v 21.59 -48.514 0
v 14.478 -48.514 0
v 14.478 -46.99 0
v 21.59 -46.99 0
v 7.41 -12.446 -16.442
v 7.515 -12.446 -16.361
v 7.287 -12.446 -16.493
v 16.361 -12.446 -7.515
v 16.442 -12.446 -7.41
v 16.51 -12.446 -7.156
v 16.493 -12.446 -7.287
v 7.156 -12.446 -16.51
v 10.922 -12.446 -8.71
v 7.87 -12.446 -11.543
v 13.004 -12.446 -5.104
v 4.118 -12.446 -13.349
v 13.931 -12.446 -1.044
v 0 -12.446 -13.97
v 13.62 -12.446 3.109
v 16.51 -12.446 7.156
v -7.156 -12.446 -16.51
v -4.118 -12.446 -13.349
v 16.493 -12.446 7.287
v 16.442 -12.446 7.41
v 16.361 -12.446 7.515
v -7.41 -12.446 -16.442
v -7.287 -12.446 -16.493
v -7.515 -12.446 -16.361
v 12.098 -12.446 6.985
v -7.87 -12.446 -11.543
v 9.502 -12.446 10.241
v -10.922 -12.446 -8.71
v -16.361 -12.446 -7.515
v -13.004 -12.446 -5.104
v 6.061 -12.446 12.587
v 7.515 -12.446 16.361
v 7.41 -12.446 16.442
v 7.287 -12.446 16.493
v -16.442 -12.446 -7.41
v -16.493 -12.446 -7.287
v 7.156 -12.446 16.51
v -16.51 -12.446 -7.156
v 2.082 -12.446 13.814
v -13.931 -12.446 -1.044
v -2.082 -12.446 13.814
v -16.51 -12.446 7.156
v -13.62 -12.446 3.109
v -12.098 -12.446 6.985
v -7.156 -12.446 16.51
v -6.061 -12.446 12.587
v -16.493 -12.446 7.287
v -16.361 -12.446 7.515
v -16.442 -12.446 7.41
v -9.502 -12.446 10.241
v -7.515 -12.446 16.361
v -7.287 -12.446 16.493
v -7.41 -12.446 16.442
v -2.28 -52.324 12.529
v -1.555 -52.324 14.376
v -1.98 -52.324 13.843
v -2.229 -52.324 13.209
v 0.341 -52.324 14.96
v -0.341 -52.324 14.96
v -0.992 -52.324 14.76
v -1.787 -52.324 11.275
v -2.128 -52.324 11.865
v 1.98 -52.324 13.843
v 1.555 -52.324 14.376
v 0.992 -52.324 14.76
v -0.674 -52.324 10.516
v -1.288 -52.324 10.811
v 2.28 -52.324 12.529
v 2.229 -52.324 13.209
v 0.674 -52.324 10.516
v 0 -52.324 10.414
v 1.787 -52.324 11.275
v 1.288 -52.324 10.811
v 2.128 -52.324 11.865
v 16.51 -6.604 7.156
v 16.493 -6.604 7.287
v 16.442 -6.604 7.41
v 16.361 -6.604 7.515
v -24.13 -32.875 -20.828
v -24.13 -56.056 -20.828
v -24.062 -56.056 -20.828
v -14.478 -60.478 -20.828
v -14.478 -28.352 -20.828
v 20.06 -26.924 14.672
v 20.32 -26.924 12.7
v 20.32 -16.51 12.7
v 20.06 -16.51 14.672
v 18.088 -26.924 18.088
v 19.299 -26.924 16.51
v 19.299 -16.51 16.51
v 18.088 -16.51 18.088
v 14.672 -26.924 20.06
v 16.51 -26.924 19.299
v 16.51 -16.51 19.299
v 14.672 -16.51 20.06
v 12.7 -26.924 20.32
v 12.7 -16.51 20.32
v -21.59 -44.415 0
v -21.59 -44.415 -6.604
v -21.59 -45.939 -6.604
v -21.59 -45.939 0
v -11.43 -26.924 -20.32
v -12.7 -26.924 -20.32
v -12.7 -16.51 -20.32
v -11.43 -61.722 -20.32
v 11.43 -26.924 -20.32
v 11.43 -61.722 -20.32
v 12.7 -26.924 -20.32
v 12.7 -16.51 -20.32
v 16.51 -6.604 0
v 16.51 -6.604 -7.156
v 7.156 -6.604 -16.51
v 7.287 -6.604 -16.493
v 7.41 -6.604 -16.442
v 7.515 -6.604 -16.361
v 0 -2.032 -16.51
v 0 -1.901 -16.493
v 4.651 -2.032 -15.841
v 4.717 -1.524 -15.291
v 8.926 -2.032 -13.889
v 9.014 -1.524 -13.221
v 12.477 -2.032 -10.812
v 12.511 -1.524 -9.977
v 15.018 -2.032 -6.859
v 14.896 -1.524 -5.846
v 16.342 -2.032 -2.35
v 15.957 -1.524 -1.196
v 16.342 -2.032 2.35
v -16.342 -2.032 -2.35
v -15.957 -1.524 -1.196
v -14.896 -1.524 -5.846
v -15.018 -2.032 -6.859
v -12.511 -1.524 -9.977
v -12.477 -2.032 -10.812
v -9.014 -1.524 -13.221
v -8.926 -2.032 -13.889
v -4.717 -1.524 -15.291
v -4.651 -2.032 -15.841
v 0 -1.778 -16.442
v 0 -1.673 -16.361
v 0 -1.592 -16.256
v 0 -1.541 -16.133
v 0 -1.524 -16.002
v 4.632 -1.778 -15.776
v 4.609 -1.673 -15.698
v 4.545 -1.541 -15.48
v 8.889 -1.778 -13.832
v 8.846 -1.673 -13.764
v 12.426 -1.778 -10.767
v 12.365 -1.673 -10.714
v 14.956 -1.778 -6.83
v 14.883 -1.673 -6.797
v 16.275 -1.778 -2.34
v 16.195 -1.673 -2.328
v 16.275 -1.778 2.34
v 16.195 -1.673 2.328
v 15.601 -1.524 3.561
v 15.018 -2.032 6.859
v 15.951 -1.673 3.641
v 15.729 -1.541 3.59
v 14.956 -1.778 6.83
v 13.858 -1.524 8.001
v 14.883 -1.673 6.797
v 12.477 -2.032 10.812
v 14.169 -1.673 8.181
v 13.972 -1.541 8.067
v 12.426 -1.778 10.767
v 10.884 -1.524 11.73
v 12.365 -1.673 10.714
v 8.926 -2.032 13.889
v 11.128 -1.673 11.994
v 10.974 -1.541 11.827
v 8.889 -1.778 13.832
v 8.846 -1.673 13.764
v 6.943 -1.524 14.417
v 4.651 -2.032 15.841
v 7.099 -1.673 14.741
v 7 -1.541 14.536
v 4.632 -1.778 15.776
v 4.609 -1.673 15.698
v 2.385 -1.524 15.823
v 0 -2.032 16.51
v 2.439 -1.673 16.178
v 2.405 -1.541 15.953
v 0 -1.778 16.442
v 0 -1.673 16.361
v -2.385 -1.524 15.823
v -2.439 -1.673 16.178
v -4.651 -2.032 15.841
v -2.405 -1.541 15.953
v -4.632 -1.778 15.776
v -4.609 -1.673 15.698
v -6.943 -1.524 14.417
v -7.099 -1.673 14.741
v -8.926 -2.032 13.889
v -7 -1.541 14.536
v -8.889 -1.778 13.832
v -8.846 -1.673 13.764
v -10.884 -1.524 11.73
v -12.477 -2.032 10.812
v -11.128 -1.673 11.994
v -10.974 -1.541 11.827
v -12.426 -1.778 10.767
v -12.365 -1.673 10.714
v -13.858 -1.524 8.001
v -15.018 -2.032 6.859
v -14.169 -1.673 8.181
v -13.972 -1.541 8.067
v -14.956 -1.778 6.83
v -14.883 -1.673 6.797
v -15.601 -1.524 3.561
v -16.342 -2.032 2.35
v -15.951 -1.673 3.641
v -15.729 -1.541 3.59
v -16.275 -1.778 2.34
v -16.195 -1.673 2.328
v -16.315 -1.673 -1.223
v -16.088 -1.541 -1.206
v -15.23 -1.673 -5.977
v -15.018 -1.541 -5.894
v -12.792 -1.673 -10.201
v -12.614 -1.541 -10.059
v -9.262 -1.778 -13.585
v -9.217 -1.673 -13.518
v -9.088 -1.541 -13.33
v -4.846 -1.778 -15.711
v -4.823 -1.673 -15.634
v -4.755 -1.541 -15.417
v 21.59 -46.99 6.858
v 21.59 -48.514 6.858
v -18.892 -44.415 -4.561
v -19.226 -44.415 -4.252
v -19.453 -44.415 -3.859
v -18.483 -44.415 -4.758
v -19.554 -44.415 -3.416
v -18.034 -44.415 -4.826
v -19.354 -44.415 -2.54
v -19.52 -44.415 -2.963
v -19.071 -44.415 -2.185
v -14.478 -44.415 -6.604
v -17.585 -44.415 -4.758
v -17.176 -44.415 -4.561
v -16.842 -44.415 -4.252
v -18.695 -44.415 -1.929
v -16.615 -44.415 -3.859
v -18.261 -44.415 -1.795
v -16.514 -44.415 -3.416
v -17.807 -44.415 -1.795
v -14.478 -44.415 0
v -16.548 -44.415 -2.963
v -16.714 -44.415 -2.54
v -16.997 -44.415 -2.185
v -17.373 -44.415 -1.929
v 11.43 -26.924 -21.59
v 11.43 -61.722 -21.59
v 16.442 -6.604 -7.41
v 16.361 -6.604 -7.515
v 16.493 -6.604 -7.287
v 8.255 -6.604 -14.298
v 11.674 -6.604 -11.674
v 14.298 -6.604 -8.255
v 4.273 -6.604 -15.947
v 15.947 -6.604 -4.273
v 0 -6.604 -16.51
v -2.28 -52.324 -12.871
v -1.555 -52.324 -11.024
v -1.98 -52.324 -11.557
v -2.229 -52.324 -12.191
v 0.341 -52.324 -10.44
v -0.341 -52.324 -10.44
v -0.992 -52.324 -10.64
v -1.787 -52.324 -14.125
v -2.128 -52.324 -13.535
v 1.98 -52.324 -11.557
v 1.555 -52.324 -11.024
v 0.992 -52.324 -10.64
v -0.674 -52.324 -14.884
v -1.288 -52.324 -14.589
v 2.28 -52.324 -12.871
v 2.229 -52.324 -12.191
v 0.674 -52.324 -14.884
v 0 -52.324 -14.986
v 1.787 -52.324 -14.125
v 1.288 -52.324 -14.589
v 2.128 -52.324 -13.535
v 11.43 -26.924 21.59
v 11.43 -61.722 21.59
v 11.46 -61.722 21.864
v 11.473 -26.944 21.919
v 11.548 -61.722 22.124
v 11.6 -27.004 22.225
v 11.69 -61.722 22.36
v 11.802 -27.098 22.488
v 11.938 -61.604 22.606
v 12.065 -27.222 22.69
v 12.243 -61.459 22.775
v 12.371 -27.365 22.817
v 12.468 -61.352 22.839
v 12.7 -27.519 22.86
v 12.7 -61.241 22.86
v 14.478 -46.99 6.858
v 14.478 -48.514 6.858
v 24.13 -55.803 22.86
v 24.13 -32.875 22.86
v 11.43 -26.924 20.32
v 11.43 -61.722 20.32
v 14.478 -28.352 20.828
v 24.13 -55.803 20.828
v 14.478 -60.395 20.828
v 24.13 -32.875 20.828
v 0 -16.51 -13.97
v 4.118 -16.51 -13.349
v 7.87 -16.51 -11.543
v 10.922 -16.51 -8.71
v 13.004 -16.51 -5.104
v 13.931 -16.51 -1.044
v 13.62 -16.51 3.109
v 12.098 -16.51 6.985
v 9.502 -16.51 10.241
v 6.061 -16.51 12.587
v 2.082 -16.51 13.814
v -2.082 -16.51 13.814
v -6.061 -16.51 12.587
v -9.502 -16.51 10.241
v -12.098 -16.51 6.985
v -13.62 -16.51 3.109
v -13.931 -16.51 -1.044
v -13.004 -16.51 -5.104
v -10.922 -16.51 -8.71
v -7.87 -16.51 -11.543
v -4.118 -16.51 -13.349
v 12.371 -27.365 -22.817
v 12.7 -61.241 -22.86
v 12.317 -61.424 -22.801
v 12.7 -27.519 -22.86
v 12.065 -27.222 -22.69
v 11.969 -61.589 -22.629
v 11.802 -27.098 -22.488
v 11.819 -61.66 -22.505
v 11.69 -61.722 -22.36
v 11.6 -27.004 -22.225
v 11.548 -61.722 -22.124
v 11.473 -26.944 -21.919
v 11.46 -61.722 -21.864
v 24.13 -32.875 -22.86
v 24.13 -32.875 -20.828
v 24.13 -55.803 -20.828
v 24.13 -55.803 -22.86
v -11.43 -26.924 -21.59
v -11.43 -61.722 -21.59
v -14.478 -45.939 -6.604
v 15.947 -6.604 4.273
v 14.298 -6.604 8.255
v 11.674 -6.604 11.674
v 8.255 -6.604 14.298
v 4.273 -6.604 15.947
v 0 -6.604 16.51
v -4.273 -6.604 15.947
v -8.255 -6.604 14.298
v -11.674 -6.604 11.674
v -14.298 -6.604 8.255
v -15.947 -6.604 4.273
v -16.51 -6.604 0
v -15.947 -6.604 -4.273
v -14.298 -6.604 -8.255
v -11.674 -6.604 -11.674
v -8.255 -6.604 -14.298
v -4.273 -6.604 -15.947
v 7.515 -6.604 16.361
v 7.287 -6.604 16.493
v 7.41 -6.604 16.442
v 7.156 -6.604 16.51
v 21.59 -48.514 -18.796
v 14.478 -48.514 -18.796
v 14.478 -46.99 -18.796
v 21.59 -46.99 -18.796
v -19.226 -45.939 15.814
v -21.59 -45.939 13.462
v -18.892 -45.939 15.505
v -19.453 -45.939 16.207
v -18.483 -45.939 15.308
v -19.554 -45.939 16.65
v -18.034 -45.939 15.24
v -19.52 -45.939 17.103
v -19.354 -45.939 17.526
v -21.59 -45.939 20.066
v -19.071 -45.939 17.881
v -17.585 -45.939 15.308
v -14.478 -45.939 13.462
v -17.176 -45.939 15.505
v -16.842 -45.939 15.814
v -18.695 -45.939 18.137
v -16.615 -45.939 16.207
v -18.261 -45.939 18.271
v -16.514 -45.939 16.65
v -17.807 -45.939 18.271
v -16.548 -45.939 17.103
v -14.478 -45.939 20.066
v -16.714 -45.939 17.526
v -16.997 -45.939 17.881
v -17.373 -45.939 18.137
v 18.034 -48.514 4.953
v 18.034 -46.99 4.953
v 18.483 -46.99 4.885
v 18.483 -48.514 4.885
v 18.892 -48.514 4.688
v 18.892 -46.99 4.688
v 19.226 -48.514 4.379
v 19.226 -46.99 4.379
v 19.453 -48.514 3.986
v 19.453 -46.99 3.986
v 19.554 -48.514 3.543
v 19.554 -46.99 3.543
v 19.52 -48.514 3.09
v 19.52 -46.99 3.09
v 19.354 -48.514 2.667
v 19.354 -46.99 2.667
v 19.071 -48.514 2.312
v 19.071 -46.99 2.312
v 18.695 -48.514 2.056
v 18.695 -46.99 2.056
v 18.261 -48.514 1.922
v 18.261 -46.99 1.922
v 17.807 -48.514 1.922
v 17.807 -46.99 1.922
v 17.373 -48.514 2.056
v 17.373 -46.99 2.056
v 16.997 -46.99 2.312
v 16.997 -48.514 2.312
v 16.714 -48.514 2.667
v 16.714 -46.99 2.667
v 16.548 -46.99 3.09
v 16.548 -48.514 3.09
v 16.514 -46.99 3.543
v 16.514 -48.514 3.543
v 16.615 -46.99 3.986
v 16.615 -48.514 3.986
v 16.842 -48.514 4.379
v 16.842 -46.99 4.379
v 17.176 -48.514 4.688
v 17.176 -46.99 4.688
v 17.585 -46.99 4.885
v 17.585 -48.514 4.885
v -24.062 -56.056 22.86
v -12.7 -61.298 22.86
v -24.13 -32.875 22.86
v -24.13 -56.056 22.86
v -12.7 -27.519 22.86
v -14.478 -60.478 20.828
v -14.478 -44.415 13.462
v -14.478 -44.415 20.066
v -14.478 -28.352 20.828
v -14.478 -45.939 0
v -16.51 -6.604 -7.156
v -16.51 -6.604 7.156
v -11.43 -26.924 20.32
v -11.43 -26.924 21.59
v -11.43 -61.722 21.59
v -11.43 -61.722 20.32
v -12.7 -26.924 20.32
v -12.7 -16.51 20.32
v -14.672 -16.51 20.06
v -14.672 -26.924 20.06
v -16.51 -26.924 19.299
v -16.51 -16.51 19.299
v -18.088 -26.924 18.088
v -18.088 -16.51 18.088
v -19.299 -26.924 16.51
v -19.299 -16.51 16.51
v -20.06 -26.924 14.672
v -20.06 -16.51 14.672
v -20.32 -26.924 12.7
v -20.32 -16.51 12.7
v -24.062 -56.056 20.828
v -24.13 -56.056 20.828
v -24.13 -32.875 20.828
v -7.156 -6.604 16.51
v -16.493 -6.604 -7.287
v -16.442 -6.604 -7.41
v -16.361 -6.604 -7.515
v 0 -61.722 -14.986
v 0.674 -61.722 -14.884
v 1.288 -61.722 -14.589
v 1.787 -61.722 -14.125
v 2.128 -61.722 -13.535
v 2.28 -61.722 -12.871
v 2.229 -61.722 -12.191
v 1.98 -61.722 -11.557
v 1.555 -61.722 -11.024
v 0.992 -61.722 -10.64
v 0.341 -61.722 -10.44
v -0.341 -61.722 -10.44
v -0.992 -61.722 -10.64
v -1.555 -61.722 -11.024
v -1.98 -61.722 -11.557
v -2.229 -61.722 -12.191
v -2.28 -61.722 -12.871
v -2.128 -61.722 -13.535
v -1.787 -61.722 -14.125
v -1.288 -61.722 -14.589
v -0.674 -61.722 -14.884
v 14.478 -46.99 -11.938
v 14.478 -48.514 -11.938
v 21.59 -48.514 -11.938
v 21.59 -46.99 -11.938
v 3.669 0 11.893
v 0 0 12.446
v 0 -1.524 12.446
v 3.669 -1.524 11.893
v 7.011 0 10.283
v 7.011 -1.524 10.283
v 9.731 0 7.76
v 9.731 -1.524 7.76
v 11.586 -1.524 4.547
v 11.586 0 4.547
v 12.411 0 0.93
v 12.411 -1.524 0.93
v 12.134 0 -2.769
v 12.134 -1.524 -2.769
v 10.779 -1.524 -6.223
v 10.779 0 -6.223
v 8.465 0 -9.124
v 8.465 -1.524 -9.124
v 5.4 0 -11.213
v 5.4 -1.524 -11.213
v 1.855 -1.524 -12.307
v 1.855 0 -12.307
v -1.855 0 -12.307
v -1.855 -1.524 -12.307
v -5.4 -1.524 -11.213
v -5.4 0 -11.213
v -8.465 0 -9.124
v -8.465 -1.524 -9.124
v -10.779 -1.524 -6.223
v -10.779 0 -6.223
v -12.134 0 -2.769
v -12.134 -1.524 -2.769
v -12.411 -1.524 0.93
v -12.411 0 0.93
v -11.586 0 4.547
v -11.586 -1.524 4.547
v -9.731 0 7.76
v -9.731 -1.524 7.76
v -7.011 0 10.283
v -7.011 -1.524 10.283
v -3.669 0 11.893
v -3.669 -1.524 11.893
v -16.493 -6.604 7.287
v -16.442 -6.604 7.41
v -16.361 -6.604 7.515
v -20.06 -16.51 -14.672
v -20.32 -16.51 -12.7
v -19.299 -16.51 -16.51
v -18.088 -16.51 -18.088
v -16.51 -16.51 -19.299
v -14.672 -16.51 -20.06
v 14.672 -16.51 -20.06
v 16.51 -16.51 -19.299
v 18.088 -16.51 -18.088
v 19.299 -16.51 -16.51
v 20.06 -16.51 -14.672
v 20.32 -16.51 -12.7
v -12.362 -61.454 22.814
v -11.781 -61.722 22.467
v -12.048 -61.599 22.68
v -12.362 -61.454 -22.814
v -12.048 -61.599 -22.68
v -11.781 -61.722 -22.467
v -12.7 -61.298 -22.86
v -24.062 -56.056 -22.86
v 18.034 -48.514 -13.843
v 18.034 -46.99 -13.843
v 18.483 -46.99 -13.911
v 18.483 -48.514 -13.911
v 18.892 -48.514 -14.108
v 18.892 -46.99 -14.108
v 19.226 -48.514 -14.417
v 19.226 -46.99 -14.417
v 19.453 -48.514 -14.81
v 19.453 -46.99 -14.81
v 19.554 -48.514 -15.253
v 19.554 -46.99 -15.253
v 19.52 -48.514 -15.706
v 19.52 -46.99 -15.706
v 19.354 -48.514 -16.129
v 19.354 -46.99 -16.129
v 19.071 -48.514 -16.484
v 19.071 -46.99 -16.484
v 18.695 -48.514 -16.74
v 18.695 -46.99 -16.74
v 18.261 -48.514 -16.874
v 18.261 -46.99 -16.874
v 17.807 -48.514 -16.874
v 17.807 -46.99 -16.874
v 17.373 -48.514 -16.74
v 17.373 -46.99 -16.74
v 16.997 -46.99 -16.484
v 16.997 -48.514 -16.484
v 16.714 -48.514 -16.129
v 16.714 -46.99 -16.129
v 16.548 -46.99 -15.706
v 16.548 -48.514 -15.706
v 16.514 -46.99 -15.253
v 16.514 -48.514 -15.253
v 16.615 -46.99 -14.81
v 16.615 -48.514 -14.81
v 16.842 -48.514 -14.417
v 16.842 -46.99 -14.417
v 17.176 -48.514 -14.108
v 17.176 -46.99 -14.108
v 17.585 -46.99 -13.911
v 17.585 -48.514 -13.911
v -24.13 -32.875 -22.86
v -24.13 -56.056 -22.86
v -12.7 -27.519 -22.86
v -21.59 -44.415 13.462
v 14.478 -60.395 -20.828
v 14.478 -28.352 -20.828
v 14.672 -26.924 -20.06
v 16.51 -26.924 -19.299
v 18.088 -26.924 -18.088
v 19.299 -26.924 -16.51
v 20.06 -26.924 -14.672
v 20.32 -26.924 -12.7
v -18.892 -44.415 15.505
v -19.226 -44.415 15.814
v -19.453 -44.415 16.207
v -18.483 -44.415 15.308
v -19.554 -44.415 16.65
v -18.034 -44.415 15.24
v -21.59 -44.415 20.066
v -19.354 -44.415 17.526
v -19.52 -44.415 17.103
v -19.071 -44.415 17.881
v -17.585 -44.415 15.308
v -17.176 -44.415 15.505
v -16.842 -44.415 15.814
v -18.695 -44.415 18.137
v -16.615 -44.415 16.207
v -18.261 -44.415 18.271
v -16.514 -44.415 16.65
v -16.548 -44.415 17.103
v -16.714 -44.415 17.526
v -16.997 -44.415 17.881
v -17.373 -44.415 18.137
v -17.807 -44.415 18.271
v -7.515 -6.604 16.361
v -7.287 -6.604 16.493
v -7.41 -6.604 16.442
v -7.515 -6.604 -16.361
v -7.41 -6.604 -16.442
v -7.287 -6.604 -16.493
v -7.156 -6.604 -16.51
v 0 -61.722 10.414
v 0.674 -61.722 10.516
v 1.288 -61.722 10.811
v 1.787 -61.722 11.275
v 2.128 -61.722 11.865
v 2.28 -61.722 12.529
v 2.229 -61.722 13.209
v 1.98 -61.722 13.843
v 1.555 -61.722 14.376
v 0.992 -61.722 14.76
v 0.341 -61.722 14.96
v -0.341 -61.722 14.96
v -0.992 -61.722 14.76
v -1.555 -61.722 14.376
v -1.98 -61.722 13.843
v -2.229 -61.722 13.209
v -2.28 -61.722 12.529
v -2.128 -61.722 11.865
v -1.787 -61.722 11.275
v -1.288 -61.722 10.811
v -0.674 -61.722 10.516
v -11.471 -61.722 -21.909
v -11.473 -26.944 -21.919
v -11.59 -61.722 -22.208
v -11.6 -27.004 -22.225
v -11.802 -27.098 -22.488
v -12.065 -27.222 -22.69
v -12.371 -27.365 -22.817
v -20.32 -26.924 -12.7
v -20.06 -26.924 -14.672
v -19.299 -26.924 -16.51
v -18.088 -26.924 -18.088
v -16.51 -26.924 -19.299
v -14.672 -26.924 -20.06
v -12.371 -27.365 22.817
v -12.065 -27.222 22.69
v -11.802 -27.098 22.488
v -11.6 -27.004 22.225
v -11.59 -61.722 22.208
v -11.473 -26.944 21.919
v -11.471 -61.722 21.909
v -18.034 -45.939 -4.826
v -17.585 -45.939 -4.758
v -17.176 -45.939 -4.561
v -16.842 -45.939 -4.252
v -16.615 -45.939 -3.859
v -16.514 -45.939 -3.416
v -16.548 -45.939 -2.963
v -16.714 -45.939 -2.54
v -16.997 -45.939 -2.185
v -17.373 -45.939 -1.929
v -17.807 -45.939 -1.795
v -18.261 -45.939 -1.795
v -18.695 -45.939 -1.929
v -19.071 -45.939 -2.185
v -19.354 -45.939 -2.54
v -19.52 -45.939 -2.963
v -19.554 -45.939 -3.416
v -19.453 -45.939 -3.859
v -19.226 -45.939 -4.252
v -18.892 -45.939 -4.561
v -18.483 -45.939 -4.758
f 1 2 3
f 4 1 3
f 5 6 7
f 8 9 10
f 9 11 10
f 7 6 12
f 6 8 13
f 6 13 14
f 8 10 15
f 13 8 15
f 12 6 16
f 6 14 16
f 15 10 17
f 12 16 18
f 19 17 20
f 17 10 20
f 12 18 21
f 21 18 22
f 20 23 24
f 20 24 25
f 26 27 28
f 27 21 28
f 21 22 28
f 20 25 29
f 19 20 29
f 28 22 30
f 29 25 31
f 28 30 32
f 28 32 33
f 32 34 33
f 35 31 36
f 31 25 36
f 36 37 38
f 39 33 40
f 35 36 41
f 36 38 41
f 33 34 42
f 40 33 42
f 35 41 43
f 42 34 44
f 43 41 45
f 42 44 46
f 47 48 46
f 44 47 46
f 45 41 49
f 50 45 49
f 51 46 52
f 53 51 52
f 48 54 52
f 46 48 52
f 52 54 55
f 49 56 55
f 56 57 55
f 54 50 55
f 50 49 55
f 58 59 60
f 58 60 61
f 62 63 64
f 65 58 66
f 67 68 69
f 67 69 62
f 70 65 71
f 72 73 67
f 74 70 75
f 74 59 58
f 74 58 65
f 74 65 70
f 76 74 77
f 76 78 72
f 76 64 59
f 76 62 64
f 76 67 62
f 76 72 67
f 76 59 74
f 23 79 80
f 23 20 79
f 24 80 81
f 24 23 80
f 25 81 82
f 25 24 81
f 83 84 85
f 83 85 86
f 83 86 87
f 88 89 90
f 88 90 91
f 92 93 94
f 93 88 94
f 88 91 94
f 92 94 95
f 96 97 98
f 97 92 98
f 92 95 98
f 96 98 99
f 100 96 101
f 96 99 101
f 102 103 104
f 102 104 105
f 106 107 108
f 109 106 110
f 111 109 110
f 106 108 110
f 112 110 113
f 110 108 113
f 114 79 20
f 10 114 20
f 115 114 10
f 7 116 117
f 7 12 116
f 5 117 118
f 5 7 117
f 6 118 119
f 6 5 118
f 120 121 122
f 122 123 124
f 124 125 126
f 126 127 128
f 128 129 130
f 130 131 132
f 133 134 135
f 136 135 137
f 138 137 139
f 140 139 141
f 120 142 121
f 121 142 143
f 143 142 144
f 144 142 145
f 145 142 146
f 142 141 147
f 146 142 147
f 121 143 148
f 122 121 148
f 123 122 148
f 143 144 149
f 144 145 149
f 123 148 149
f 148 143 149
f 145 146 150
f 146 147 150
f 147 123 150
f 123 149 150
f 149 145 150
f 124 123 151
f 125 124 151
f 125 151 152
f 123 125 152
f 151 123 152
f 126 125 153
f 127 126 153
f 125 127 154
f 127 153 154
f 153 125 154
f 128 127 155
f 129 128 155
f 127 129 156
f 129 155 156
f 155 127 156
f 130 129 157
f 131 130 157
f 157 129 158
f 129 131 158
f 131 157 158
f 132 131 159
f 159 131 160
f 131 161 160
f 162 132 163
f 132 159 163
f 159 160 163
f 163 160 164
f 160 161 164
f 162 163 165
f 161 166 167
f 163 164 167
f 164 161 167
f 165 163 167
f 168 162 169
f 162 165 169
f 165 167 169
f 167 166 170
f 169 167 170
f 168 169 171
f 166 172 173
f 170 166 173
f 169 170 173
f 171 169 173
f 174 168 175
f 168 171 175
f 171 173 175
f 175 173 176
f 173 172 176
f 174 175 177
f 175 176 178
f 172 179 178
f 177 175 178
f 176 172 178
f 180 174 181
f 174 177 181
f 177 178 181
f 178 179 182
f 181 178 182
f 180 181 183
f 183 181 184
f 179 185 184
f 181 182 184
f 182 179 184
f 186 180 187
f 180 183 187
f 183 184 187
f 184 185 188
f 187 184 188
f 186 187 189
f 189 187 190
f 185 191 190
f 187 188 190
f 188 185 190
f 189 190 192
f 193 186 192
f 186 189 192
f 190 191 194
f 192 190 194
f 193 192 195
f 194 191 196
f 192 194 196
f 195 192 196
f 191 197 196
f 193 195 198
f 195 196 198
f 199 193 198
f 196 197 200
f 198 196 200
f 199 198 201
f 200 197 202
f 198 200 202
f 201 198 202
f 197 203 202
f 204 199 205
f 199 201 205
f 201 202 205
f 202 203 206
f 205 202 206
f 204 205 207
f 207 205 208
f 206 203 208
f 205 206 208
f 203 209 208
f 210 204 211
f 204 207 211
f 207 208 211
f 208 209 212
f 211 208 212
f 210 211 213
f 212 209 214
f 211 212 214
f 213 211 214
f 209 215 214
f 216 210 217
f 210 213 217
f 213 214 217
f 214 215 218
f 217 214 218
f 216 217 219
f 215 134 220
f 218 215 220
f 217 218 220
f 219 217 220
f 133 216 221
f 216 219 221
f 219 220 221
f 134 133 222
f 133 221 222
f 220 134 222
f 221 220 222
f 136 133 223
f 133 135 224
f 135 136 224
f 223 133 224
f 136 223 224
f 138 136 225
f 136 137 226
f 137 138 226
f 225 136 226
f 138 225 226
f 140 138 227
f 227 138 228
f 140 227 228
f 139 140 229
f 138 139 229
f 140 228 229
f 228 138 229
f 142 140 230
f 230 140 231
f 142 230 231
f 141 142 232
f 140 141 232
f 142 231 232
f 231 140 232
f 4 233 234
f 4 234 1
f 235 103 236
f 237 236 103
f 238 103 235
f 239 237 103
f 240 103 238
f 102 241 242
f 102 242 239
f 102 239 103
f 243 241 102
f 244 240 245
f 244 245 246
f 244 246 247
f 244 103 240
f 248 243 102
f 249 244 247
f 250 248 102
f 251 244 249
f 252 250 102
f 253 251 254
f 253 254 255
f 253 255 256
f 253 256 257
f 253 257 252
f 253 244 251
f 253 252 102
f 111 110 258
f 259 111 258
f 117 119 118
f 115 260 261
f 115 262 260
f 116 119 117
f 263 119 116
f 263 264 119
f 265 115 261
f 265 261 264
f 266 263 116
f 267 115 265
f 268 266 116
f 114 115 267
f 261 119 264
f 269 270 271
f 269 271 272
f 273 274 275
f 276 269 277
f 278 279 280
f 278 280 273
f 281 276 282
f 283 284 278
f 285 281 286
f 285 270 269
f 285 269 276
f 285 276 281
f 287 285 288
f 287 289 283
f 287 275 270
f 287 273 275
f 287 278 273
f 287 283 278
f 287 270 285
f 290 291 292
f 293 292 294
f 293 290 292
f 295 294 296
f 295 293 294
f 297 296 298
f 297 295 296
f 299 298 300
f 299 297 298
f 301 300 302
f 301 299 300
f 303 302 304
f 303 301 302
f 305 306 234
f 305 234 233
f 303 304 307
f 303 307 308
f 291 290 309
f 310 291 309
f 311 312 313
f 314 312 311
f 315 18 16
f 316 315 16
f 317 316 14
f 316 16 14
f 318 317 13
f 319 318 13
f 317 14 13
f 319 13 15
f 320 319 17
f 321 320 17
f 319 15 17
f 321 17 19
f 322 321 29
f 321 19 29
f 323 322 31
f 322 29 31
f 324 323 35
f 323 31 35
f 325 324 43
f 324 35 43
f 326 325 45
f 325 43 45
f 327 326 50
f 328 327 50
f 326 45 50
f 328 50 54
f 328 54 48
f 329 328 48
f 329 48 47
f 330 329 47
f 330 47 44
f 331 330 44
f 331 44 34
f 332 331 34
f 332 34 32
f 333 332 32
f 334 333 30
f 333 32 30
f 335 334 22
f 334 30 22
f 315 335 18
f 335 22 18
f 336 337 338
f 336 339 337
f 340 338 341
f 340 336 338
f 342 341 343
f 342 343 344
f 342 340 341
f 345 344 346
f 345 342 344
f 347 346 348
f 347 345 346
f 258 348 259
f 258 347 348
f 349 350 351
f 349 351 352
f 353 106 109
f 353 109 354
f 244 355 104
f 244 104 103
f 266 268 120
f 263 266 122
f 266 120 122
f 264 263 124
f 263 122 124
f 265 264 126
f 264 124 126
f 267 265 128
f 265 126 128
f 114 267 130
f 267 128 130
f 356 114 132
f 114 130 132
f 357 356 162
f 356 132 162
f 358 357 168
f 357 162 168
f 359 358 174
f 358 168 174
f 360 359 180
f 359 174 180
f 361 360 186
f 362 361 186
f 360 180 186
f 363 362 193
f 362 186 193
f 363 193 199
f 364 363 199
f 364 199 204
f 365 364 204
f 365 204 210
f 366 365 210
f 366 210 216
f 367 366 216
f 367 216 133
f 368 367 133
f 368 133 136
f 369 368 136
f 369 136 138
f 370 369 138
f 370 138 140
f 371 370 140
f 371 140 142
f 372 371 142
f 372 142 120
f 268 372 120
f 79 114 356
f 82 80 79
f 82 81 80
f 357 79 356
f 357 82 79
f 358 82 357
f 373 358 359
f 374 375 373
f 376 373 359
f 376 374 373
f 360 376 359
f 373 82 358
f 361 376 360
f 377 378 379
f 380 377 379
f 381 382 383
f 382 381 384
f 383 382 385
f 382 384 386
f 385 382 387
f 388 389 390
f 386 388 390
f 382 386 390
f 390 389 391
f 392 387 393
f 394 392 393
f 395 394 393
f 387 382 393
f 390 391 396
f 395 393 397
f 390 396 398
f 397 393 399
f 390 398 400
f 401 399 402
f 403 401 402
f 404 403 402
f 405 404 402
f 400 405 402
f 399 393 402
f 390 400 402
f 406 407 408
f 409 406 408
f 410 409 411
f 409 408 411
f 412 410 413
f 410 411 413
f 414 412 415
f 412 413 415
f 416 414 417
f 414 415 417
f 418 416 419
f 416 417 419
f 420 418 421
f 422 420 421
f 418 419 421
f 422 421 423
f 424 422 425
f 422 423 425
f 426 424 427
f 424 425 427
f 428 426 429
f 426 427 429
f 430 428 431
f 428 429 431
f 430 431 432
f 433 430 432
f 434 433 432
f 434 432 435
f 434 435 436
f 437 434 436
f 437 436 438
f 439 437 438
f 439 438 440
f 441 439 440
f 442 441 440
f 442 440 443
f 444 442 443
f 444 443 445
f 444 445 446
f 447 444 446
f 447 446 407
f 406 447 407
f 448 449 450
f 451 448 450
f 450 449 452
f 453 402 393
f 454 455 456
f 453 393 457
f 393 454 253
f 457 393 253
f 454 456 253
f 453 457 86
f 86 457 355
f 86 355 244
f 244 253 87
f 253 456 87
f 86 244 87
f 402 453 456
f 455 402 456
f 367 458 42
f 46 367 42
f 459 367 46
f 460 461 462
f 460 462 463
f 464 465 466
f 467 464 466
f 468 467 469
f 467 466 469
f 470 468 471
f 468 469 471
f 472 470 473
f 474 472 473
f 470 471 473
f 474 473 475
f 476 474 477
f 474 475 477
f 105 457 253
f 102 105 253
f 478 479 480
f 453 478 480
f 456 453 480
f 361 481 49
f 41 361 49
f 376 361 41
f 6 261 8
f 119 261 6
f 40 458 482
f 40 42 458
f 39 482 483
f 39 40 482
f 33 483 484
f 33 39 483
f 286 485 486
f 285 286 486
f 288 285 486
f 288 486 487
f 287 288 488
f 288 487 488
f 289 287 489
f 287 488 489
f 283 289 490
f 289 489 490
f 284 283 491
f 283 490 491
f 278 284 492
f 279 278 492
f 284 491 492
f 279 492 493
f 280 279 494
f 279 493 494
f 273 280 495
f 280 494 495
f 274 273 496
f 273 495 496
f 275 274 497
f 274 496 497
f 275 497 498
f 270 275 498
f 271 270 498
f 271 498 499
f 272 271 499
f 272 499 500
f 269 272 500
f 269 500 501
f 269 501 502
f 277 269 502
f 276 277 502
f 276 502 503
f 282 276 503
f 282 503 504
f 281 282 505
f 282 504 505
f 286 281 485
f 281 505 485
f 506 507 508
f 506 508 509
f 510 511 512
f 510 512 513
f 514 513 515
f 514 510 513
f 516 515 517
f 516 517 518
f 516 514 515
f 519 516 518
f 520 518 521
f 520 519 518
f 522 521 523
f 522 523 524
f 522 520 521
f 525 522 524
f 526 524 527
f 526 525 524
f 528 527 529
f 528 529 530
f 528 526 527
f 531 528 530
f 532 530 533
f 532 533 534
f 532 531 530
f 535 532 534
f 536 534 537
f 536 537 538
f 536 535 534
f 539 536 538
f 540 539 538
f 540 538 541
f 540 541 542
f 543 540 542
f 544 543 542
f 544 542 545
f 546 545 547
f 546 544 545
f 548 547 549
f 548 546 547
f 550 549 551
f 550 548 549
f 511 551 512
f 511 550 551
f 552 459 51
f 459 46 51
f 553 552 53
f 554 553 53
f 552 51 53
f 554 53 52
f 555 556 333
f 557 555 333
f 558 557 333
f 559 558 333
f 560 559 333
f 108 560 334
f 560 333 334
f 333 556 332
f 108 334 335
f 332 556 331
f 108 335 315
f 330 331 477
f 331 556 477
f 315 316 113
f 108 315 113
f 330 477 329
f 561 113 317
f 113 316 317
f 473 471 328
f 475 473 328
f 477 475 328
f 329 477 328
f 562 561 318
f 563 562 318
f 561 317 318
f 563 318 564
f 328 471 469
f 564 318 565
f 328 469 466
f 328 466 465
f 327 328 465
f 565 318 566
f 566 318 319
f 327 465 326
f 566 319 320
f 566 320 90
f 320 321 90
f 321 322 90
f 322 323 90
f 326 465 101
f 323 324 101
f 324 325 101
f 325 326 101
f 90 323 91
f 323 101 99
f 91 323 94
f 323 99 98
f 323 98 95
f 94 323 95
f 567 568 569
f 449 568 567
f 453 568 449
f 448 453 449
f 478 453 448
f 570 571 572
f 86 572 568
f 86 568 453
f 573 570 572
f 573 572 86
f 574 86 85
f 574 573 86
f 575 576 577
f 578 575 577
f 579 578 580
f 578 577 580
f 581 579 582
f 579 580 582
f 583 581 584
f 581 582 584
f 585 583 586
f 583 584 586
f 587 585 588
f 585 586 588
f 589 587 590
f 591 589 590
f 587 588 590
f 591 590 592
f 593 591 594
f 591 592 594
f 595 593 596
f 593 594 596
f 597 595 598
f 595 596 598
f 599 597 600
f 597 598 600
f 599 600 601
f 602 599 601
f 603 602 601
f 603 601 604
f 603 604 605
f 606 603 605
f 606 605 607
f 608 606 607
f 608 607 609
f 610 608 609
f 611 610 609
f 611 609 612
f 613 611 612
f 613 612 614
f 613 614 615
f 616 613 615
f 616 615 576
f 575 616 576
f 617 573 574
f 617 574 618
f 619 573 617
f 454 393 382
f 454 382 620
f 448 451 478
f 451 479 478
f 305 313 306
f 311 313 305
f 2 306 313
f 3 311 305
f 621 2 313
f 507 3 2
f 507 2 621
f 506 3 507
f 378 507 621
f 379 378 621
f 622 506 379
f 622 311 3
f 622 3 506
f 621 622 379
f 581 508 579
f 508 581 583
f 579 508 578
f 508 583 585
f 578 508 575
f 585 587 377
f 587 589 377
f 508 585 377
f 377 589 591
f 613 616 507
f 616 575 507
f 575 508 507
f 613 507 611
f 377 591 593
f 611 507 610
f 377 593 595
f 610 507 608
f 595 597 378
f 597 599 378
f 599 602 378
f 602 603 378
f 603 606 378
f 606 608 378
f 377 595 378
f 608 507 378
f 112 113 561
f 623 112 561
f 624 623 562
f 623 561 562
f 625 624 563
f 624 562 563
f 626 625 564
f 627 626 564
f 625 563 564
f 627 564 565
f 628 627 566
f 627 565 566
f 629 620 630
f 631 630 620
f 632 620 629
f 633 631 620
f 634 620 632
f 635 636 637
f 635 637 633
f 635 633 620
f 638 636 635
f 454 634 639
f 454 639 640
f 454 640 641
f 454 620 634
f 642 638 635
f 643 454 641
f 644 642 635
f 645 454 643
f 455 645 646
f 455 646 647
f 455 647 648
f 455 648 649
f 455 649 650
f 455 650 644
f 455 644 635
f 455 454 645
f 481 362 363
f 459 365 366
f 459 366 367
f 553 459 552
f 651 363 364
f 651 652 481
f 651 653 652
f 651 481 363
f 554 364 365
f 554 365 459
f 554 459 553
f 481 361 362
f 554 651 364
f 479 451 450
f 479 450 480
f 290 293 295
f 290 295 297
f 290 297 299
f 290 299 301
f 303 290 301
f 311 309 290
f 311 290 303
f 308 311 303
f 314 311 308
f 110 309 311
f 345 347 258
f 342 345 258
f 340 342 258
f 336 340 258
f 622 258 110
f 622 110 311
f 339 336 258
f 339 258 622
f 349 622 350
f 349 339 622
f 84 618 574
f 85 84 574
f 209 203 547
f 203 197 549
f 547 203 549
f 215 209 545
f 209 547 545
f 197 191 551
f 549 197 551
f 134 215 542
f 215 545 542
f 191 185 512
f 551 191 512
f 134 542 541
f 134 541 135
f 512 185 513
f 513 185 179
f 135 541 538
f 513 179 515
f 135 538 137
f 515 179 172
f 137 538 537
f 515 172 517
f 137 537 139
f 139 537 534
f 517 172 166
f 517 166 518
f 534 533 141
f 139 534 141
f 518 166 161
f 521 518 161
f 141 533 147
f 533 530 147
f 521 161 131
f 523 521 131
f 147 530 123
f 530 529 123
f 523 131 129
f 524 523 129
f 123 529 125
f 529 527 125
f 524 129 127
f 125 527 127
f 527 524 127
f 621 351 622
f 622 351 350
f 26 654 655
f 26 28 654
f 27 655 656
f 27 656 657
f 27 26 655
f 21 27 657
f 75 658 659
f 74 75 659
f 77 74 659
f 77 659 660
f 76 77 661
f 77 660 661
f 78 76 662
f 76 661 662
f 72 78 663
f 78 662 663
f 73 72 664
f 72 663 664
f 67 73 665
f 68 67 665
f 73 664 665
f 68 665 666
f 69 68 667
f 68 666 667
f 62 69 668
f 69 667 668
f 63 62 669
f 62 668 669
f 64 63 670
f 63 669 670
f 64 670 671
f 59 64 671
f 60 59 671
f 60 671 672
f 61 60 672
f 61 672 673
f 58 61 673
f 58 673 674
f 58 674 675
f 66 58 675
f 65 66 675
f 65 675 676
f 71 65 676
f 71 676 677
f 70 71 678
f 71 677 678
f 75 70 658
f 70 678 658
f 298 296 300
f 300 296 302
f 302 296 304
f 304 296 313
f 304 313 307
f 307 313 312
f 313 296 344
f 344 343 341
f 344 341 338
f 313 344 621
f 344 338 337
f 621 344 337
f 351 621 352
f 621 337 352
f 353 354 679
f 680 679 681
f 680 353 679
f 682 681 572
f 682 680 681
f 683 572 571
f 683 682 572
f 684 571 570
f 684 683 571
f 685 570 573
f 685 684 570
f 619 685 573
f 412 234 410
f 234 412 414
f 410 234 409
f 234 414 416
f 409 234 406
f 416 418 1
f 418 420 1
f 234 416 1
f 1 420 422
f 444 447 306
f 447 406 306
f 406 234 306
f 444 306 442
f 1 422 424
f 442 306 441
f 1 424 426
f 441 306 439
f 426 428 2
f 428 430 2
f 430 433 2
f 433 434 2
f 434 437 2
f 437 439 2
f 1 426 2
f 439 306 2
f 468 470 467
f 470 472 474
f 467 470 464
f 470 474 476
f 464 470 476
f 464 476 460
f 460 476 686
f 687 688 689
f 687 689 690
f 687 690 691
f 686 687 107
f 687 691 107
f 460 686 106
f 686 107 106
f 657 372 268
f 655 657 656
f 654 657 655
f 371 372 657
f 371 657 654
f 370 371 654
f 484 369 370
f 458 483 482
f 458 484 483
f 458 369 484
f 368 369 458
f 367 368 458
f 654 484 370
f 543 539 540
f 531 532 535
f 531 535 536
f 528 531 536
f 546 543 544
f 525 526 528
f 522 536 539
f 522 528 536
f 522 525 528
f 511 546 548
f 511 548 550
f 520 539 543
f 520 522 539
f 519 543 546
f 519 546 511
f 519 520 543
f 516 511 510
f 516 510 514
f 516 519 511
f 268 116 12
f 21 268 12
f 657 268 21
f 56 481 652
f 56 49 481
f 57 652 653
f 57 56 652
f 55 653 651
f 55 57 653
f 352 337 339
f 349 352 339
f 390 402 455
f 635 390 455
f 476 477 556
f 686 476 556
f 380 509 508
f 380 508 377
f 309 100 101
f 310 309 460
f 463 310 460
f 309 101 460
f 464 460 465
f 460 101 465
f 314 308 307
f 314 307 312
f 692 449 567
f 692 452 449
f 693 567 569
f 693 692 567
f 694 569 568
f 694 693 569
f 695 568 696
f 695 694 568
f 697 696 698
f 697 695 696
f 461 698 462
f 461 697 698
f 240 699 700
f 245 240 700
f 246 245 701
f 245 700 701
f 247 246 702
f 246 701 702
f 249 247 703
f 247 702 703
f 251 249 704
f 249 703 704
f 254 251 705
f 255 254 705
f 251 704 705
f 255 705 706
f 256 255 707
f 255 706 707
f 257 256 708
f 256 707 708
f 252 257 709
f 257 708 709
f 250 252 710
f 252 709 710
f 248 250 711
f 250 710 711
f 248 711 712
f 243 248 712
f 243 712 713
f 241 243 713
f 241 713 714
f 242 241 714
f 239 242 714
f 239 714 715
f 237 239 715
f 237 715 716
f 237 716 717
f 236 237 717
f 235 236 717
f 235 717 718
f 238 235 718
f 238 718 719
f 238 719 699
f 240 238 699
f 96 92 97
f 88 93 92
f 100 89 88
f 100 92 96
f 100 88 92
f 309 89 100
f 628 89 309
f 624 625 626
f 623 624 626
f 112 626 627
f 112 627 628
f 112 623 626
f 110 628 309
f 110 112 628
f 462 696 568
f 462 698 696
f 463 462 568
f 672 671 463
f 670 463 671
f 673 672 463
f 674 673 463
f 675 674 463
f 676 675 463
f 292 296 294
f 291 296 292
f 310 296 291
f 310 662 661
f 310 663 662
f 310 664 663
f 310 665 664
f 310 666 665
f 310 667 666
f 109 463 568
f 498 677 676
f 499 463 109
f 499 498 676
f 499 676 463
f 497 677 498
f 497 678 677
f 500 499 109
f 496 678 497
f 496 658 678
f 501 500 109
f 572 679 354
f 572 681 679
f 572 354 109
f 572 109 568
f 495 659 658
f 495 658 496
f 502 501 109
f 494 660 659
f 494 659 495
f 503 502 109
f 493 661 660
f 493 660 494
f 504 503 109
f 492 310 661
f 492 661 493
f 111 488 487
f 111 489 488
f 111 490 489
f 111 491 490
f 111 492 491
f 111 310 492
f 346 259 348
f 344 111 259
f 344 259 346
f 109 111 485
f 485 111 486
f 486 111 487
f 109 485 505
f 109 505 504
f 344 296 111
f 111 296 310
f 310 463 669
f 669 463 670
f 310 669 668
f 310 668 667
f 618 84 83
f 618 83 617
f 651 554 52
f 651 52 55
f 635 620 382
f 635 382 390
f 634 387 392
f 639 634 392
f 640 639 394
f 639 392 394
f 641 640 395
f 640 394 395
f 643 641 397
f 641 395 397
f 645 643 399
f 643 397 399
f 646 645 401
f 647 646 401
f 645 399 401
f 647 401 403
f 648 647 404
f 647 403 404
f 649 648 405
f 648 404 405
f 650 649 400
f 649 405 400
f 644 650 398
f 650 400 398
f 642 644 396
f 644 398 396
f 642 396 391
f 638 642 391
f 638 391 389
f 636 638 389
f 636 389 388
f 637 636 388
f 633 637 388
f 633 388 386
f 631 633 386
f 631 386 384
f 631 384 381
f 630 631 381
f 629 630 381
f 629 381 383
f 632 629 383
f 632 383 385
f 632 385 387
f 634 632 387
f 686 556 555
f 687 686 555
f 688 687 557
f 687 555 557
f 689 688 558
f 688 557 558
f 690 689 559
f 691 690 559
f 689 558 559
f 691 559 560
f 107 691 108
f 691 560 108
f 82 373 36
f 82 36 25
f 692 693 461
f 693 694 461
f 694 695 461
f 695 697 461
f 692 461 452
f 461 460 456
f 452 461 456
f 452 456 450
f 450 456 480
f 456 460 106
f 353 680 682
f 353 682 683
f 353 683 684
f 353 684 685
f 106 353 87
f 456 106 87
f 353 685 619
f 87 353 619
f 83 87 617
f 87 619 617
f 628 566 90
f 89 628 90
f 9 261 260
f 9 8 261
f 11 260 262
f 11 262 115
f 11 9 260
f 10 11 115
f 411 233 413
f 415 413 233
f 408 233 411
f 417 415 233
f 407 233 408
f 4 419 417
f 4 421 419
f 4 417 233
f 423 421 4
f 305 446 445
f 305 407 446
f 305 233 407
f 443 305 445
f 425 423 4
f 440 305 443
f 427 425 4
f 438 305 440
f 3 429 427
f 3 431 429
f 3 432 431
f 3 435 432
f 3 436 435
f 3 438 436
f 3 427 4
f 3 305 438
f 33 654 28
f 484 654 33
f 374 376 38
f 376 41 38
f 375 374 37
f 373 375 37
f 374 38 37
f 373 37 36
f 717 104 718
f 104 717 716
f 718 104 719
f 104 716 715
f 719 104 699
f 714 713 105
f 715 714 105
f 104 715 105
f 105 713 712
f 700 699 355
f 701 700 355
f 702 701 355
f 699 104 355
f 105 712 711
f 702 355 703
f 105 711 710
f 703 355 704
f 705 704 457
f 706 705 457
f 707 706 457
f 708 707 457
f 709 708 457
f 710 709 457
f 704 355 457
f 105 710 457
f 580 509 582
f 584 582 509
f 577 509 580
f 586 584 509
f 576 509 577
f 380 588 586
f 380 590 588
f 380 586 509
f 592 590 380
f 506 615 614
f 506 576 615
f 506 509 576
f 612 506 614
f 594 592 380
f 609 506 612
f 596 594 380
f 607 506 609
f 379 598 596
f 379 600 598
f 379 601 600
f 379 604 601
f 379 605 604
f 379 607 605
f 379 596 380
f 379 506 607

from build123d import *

# Parameters (mm, degrees)
SKETCH1_R           = 12.446
BOSS_EXTRUDE1_DEPTH = 1.524
SKETCH2_R           = 16.51
BOSS_EXTRUDE2_DEPTH = 5.08
BOSS_EXTRUDE3_DEPTH = 5.842
FILLET1_R           = 0.508
FILLET2_R           = 0.508
SKETCH4_R           = 13.97
BOSS_EXTRUDE4_DEPTH = 4.064
BOSS_EXTRUDE5_DEPTH = 10.414
SKETCH6_W           = 22.86
SKETCH6_H           = 40.64
BOSS_EXTRUDE6_DEPTH = 34.798
SKETCH7_R           = 2.286
CUT_EXTRUDE1_DEPTH  = 9.398
SKETCH9_W           = 45.72
SKETCH9_H           = 34.798
BOSS_EXTRUDE7_DEPTH = 12.7
SKETCH10_W          = 41.656
SKETCH10_H          = 34.798
CUT_EXTRUDE2_DEPTH  = 9.652
CUT_EXTRUDE4_DEPTH  = 81.511990312
CUT_EXTRUDE5_DEPTH  = 81.511990312
SKETCH13_W          = 6.858
SKETCH13_H          = 1.524
BOSS_EXTRUDE8_DEPTH = 7.112
SKETCH14_W          = 6.604
SKETCH14_H          = 1.524
BOSS_EXTRUDE9_DEPTH = 7.112
SKETCH16_R          = 1.524
CUT_EXTRUDE7_DEPTH  = 7.112
SKETCH17_R          = 1.524
CUT_EXTRUDE8_DEPTH  = 12.7
FILLET3_R           = 1.27


with BuildPart() as part:
    # Sketch1 → Boss-Extrude1 (new body)
    with BuildSketch(Plane(origin=(0, 0, 0), x_dir=(1, 0, 0), z_dir=(0, 1, 0))):
        with Locations(Location((0, 0, 0), (0, 0, 270))):
            Circle(SKETCH1_R)
    extrude(amount=-BOSS_EXTRUDE1_DEPTH)

    # Sketch2 → Boss-Extrude2 (add)
    with BuildSketch(Plane.XZ.offset(1.524)):
        with Locations(Location((0, 0, 0), (0, 0, 270))):
            Circle(SKETCH2_R)
    extrude(amount=BOSS_EXTRUDE2_DEPTH)

    # Sketch3 → Boss-Extrude3 (add)
    with BuildSketch(Plane.XZ.offset(6.604)):
        Polygon((16.51, 7.366), (16.51, -7.366), (7.366, -16.51), (-7.366, -16.51), (-16.51, -7.366), (-16.51, 7.366), (-7.366, 16.51), (7.366, 16.51), align=None)
    extrude(amount=BOSS_EXTRUDE3_DEPTH)

    # Fillet1
    fillet1_edges = [part.edges().sort_by_distance(p)[0] for p in [
        (0, -1.524, 16.51),
    ]]
    fillet(fillet1_edges, radius=FILLET1_R)

    # Fillet2
    fillet2_edges = [part.edges().sort_by_distance(p)[0] for p in [
        (7.366, -9.525, -16.51),
        (16.51, -9.525, -7.366),
        (16.51, -9.525, 7.366),
        (7.366, -9.525, 16.51),
        (-7.366, -9.525, 16.51),
        (-16.51, -9.525, 7.366),
        (-16.51, -9.525, -7.366),
        (-7.366, -9.525, -16.51),
    ]]
    fillet(fillet2_edges, radius=FILLET2_R)

    # Sketch4 → Boss-Extrude4 (add)
    with BuildSketch(Plane.XZ.offset(12.446)):
        with Locations(Location((0, 0, 0), (0, 0, 270))):
            Circle(SKETCH4_R)
    extrude(amount=BOSS_EXTRUDE4_DEPTH)

    # Sketch5 → Boss-Extrude5 (add)
    with BuildSketch(Plane.XZ.offset(16.51)):
        with BuildLine():
            Line((12.7, 20.32), (-12.7, 20.32))
            ThreePointArc((-12.7, 20.32), (-18.088153673, 18.088153673), (-20.32, 12.7))
            Line((-20.32, 12.7), (-20.32, -12.7))
            ThreePointArc((-20.32, -12.7), (-18.088153673, -18.088153673), (-12.7, -20.32))
            Line((-12.7, -20.32), (12.7, -20.32))
            ThreePointArc((12.7, -20.32), (18.088153673, -18.088153673), (20.32, -12.7))
            Line((20.32, -12.7), (20.32, 12.7))
            ThreePointArc((20.32, 12.7), (18.088153673, 18.088153673), (12.7, 20.32))
        make_face()
    extrude(amount=BOSS_EXTRUDE5_DEPTH)

    # Sketch6 → Boss-Extrude6 (add)
    with BuildSketch(Plane.XZ.offset(26.924)):
        Rectangle(SKETCH6_W, SKETCH6_H)
    extrude(amount=BOSS_EXTRUDE6_DEPTH)

    # Sketch7 → Cut-Extrude1 (cut)
    with BuildSketch(Plane.XZ.offset(61.722)):
        with Locations(Location((0, -12.7, 0), (0, 0, 270))):
            Circle(SKETCH7_R)
        with Locations(Location((0, 12.7, 0), (0, 0, 270))):
            Circle(SKETCH7_R)
    extrude(amount=-CUT_EXTRUDE1_DEPTH, mode=Mode.SUBTRACT)

    # Sketch9 → Boss-Extrude7 (add)
    with BuildSketch(Plane(origin=(11.43, 0, 0), x_dir=(0, 0, -1), z_dir=(1, 0, 0))):
        with Locations((0, -44.323)):
            Rectangle(SKETCH9_W, SKETCH9_H)
    boss_extrude7 = extrude(amount=BOSS_EXTRUDE7_DEPTH)

    # Mirror1: Boss-Extrude7 across plane
    add(boss_extrude7.mirror(Plane(origin=(0, 0, 0), x_dir=(0, 0, 1), z_dir=(1, 0, 0))))

    # Sketch10 → Cut-Extrude2 (cut)
    with BuildSketch(Plane(origin=(24.13, 0, 0), x_dir=(0, 0, -1), z_dir=(1, 0, 0))):
        with Locations((0, -44.323)):
            Rectangle(SKETCH10_W, SKETCH10_H)
    cut_extrude2 = extrude(amount=-CUT_EXTRUDE2_DEPTH, mode=Mode.SUBTRACT)

    # Mirror2: Cut-Extrude2 across plane
    add(cut_extrude2.mirror(Plane(origin=(0, 0, 0), x_dir=(0, 0, 1), z_dir=(1, 0, 0))), mode=Mode.SUBTRACT)

    # Sketch11 → Cut-Extrude4 (cut, through all)
    with BuildSketch(Plane(origin=(0, 0, -22.86), x_dir=(-1, 0, 0), z_dir=(0, 0, -1))):
        Polygon((-11.43, -26.924), (-24.13, -32.874707767), (-24.13, -26.924), align=None)
        Polygon((24.13, -32.874707767), (24.13, -26.924), (11.43, -26.924), align=None)
        Polygon((11.326658159, -61.931639732), (24.061569251, -56.056015305), (24.026436821, -62.006619362), align=None)
        Polygon((-24.197589663, -55.77109271), (-24.232722094, -61.721696766), (-11.532943432, -61.796676397), align=None)
    extrude(amount=-CUT_EXTRUDE4_DEPTH, mode=Mode.SUBTRACT)

    # Sketch12 → Cut-Extrude5 (cut, through all)
    with BuildSketch(Plane(origin=(0, 0, -22.86), x_dir=(-1, 0, 0), z_dir=(0, 0, -1))):
        Polygon((27.344093716, -61.722), (27.344093716, -56.075395365), (24.061569251, -56.056015305), (20.546985538, -61.722), align=None)
    extrude(amount=-CUT_EXTRUDE5_DEPTH, mode=Mode.SUBTRACT)

    # Sketch13 → Boss-Extrude8 (add)
    with BuildSketch(Plane(origin=(14.478, 0, 0), x_dir=(0, 0, -1), z_dir=(1, 0, 0))):
        with Locations((-3.429, -47.752)):
            Rectangle(SKETCH13_W, SKETCH13_H)
        with Locations((15.367, -47.752)):
            Rectangle(SKETCH13_W, SKETCH13_H)
    extrude(amount=BOSS_EXTRUDE8_DEPTH)

    # Sketch14 → Boss-Extrude9 (add)
    with BuildSketch(Plane.ZY.offset(14.478)):
        with Locations((-3.302, -45.176922844)):
            Rectangle(SKETCH14_W, SKETCH14_H)
        with Locations((16.764, -45.176922844)):
            Rectangle(SKETCH14_W, SKETCH14_H)
    extrude(amount=BOSS_EXTRUDE9_DEPTH)

    # Sketch16 → Cut-Extrude7 (cut)
    with BuildSketch(Plane.XZ.offset(45.938922844)):
        with Locations(Location((-18.034, -3.302, 0), (0, 0, 270))):
            Circle(SKETCH16_R)
        with Locations(Location((-18.034, 16.764, 0), (0, 0, 270))):
            Circle(SKETCH16_R)
        with Locations((18.034, 3.429)):
            Circle(SKETCH16_R)
        with Locations((18.034, -15.367)):
            Circle(SKETCH16_R)
    extrude(amount=-CUT_EXTRUDE7_DEPTH, mode=Mode.SUBTRACT)

    # Sketch17 → Cut-Extrude8 (cut)
    with BuildSketch(Plane(origin=(0, -38.1, 0), x_dir=(1, 0, 0), z_dir=(0, 1, 0))):
        with Locations(Location((18.034, 15.367, 0), (0, 0, 270))):
            Circle(SKETCH17_R)
        with Locations(Location((18.034, -3.429, 0), (0, 0, 270))):
            Circle(SKETCH17_R)
    extrude(amount=-CUT_EXTRUDE8_DEPTH, mode=Mode.SUBTRACT)

    # Fillet3
    fillet3_edges = [part.edges().sort_by_distance(p)[0] for p in [
        (-11.43, -44.323, -22.86),
        (11.43, -44.323, -22.86),
        (-11.43, -44.323, 22.86),
        (11.43, -44.323, 22.86),
    ]]
    fillet(fillet3_edges, radius=FILLET3_R)


solid = part.part
